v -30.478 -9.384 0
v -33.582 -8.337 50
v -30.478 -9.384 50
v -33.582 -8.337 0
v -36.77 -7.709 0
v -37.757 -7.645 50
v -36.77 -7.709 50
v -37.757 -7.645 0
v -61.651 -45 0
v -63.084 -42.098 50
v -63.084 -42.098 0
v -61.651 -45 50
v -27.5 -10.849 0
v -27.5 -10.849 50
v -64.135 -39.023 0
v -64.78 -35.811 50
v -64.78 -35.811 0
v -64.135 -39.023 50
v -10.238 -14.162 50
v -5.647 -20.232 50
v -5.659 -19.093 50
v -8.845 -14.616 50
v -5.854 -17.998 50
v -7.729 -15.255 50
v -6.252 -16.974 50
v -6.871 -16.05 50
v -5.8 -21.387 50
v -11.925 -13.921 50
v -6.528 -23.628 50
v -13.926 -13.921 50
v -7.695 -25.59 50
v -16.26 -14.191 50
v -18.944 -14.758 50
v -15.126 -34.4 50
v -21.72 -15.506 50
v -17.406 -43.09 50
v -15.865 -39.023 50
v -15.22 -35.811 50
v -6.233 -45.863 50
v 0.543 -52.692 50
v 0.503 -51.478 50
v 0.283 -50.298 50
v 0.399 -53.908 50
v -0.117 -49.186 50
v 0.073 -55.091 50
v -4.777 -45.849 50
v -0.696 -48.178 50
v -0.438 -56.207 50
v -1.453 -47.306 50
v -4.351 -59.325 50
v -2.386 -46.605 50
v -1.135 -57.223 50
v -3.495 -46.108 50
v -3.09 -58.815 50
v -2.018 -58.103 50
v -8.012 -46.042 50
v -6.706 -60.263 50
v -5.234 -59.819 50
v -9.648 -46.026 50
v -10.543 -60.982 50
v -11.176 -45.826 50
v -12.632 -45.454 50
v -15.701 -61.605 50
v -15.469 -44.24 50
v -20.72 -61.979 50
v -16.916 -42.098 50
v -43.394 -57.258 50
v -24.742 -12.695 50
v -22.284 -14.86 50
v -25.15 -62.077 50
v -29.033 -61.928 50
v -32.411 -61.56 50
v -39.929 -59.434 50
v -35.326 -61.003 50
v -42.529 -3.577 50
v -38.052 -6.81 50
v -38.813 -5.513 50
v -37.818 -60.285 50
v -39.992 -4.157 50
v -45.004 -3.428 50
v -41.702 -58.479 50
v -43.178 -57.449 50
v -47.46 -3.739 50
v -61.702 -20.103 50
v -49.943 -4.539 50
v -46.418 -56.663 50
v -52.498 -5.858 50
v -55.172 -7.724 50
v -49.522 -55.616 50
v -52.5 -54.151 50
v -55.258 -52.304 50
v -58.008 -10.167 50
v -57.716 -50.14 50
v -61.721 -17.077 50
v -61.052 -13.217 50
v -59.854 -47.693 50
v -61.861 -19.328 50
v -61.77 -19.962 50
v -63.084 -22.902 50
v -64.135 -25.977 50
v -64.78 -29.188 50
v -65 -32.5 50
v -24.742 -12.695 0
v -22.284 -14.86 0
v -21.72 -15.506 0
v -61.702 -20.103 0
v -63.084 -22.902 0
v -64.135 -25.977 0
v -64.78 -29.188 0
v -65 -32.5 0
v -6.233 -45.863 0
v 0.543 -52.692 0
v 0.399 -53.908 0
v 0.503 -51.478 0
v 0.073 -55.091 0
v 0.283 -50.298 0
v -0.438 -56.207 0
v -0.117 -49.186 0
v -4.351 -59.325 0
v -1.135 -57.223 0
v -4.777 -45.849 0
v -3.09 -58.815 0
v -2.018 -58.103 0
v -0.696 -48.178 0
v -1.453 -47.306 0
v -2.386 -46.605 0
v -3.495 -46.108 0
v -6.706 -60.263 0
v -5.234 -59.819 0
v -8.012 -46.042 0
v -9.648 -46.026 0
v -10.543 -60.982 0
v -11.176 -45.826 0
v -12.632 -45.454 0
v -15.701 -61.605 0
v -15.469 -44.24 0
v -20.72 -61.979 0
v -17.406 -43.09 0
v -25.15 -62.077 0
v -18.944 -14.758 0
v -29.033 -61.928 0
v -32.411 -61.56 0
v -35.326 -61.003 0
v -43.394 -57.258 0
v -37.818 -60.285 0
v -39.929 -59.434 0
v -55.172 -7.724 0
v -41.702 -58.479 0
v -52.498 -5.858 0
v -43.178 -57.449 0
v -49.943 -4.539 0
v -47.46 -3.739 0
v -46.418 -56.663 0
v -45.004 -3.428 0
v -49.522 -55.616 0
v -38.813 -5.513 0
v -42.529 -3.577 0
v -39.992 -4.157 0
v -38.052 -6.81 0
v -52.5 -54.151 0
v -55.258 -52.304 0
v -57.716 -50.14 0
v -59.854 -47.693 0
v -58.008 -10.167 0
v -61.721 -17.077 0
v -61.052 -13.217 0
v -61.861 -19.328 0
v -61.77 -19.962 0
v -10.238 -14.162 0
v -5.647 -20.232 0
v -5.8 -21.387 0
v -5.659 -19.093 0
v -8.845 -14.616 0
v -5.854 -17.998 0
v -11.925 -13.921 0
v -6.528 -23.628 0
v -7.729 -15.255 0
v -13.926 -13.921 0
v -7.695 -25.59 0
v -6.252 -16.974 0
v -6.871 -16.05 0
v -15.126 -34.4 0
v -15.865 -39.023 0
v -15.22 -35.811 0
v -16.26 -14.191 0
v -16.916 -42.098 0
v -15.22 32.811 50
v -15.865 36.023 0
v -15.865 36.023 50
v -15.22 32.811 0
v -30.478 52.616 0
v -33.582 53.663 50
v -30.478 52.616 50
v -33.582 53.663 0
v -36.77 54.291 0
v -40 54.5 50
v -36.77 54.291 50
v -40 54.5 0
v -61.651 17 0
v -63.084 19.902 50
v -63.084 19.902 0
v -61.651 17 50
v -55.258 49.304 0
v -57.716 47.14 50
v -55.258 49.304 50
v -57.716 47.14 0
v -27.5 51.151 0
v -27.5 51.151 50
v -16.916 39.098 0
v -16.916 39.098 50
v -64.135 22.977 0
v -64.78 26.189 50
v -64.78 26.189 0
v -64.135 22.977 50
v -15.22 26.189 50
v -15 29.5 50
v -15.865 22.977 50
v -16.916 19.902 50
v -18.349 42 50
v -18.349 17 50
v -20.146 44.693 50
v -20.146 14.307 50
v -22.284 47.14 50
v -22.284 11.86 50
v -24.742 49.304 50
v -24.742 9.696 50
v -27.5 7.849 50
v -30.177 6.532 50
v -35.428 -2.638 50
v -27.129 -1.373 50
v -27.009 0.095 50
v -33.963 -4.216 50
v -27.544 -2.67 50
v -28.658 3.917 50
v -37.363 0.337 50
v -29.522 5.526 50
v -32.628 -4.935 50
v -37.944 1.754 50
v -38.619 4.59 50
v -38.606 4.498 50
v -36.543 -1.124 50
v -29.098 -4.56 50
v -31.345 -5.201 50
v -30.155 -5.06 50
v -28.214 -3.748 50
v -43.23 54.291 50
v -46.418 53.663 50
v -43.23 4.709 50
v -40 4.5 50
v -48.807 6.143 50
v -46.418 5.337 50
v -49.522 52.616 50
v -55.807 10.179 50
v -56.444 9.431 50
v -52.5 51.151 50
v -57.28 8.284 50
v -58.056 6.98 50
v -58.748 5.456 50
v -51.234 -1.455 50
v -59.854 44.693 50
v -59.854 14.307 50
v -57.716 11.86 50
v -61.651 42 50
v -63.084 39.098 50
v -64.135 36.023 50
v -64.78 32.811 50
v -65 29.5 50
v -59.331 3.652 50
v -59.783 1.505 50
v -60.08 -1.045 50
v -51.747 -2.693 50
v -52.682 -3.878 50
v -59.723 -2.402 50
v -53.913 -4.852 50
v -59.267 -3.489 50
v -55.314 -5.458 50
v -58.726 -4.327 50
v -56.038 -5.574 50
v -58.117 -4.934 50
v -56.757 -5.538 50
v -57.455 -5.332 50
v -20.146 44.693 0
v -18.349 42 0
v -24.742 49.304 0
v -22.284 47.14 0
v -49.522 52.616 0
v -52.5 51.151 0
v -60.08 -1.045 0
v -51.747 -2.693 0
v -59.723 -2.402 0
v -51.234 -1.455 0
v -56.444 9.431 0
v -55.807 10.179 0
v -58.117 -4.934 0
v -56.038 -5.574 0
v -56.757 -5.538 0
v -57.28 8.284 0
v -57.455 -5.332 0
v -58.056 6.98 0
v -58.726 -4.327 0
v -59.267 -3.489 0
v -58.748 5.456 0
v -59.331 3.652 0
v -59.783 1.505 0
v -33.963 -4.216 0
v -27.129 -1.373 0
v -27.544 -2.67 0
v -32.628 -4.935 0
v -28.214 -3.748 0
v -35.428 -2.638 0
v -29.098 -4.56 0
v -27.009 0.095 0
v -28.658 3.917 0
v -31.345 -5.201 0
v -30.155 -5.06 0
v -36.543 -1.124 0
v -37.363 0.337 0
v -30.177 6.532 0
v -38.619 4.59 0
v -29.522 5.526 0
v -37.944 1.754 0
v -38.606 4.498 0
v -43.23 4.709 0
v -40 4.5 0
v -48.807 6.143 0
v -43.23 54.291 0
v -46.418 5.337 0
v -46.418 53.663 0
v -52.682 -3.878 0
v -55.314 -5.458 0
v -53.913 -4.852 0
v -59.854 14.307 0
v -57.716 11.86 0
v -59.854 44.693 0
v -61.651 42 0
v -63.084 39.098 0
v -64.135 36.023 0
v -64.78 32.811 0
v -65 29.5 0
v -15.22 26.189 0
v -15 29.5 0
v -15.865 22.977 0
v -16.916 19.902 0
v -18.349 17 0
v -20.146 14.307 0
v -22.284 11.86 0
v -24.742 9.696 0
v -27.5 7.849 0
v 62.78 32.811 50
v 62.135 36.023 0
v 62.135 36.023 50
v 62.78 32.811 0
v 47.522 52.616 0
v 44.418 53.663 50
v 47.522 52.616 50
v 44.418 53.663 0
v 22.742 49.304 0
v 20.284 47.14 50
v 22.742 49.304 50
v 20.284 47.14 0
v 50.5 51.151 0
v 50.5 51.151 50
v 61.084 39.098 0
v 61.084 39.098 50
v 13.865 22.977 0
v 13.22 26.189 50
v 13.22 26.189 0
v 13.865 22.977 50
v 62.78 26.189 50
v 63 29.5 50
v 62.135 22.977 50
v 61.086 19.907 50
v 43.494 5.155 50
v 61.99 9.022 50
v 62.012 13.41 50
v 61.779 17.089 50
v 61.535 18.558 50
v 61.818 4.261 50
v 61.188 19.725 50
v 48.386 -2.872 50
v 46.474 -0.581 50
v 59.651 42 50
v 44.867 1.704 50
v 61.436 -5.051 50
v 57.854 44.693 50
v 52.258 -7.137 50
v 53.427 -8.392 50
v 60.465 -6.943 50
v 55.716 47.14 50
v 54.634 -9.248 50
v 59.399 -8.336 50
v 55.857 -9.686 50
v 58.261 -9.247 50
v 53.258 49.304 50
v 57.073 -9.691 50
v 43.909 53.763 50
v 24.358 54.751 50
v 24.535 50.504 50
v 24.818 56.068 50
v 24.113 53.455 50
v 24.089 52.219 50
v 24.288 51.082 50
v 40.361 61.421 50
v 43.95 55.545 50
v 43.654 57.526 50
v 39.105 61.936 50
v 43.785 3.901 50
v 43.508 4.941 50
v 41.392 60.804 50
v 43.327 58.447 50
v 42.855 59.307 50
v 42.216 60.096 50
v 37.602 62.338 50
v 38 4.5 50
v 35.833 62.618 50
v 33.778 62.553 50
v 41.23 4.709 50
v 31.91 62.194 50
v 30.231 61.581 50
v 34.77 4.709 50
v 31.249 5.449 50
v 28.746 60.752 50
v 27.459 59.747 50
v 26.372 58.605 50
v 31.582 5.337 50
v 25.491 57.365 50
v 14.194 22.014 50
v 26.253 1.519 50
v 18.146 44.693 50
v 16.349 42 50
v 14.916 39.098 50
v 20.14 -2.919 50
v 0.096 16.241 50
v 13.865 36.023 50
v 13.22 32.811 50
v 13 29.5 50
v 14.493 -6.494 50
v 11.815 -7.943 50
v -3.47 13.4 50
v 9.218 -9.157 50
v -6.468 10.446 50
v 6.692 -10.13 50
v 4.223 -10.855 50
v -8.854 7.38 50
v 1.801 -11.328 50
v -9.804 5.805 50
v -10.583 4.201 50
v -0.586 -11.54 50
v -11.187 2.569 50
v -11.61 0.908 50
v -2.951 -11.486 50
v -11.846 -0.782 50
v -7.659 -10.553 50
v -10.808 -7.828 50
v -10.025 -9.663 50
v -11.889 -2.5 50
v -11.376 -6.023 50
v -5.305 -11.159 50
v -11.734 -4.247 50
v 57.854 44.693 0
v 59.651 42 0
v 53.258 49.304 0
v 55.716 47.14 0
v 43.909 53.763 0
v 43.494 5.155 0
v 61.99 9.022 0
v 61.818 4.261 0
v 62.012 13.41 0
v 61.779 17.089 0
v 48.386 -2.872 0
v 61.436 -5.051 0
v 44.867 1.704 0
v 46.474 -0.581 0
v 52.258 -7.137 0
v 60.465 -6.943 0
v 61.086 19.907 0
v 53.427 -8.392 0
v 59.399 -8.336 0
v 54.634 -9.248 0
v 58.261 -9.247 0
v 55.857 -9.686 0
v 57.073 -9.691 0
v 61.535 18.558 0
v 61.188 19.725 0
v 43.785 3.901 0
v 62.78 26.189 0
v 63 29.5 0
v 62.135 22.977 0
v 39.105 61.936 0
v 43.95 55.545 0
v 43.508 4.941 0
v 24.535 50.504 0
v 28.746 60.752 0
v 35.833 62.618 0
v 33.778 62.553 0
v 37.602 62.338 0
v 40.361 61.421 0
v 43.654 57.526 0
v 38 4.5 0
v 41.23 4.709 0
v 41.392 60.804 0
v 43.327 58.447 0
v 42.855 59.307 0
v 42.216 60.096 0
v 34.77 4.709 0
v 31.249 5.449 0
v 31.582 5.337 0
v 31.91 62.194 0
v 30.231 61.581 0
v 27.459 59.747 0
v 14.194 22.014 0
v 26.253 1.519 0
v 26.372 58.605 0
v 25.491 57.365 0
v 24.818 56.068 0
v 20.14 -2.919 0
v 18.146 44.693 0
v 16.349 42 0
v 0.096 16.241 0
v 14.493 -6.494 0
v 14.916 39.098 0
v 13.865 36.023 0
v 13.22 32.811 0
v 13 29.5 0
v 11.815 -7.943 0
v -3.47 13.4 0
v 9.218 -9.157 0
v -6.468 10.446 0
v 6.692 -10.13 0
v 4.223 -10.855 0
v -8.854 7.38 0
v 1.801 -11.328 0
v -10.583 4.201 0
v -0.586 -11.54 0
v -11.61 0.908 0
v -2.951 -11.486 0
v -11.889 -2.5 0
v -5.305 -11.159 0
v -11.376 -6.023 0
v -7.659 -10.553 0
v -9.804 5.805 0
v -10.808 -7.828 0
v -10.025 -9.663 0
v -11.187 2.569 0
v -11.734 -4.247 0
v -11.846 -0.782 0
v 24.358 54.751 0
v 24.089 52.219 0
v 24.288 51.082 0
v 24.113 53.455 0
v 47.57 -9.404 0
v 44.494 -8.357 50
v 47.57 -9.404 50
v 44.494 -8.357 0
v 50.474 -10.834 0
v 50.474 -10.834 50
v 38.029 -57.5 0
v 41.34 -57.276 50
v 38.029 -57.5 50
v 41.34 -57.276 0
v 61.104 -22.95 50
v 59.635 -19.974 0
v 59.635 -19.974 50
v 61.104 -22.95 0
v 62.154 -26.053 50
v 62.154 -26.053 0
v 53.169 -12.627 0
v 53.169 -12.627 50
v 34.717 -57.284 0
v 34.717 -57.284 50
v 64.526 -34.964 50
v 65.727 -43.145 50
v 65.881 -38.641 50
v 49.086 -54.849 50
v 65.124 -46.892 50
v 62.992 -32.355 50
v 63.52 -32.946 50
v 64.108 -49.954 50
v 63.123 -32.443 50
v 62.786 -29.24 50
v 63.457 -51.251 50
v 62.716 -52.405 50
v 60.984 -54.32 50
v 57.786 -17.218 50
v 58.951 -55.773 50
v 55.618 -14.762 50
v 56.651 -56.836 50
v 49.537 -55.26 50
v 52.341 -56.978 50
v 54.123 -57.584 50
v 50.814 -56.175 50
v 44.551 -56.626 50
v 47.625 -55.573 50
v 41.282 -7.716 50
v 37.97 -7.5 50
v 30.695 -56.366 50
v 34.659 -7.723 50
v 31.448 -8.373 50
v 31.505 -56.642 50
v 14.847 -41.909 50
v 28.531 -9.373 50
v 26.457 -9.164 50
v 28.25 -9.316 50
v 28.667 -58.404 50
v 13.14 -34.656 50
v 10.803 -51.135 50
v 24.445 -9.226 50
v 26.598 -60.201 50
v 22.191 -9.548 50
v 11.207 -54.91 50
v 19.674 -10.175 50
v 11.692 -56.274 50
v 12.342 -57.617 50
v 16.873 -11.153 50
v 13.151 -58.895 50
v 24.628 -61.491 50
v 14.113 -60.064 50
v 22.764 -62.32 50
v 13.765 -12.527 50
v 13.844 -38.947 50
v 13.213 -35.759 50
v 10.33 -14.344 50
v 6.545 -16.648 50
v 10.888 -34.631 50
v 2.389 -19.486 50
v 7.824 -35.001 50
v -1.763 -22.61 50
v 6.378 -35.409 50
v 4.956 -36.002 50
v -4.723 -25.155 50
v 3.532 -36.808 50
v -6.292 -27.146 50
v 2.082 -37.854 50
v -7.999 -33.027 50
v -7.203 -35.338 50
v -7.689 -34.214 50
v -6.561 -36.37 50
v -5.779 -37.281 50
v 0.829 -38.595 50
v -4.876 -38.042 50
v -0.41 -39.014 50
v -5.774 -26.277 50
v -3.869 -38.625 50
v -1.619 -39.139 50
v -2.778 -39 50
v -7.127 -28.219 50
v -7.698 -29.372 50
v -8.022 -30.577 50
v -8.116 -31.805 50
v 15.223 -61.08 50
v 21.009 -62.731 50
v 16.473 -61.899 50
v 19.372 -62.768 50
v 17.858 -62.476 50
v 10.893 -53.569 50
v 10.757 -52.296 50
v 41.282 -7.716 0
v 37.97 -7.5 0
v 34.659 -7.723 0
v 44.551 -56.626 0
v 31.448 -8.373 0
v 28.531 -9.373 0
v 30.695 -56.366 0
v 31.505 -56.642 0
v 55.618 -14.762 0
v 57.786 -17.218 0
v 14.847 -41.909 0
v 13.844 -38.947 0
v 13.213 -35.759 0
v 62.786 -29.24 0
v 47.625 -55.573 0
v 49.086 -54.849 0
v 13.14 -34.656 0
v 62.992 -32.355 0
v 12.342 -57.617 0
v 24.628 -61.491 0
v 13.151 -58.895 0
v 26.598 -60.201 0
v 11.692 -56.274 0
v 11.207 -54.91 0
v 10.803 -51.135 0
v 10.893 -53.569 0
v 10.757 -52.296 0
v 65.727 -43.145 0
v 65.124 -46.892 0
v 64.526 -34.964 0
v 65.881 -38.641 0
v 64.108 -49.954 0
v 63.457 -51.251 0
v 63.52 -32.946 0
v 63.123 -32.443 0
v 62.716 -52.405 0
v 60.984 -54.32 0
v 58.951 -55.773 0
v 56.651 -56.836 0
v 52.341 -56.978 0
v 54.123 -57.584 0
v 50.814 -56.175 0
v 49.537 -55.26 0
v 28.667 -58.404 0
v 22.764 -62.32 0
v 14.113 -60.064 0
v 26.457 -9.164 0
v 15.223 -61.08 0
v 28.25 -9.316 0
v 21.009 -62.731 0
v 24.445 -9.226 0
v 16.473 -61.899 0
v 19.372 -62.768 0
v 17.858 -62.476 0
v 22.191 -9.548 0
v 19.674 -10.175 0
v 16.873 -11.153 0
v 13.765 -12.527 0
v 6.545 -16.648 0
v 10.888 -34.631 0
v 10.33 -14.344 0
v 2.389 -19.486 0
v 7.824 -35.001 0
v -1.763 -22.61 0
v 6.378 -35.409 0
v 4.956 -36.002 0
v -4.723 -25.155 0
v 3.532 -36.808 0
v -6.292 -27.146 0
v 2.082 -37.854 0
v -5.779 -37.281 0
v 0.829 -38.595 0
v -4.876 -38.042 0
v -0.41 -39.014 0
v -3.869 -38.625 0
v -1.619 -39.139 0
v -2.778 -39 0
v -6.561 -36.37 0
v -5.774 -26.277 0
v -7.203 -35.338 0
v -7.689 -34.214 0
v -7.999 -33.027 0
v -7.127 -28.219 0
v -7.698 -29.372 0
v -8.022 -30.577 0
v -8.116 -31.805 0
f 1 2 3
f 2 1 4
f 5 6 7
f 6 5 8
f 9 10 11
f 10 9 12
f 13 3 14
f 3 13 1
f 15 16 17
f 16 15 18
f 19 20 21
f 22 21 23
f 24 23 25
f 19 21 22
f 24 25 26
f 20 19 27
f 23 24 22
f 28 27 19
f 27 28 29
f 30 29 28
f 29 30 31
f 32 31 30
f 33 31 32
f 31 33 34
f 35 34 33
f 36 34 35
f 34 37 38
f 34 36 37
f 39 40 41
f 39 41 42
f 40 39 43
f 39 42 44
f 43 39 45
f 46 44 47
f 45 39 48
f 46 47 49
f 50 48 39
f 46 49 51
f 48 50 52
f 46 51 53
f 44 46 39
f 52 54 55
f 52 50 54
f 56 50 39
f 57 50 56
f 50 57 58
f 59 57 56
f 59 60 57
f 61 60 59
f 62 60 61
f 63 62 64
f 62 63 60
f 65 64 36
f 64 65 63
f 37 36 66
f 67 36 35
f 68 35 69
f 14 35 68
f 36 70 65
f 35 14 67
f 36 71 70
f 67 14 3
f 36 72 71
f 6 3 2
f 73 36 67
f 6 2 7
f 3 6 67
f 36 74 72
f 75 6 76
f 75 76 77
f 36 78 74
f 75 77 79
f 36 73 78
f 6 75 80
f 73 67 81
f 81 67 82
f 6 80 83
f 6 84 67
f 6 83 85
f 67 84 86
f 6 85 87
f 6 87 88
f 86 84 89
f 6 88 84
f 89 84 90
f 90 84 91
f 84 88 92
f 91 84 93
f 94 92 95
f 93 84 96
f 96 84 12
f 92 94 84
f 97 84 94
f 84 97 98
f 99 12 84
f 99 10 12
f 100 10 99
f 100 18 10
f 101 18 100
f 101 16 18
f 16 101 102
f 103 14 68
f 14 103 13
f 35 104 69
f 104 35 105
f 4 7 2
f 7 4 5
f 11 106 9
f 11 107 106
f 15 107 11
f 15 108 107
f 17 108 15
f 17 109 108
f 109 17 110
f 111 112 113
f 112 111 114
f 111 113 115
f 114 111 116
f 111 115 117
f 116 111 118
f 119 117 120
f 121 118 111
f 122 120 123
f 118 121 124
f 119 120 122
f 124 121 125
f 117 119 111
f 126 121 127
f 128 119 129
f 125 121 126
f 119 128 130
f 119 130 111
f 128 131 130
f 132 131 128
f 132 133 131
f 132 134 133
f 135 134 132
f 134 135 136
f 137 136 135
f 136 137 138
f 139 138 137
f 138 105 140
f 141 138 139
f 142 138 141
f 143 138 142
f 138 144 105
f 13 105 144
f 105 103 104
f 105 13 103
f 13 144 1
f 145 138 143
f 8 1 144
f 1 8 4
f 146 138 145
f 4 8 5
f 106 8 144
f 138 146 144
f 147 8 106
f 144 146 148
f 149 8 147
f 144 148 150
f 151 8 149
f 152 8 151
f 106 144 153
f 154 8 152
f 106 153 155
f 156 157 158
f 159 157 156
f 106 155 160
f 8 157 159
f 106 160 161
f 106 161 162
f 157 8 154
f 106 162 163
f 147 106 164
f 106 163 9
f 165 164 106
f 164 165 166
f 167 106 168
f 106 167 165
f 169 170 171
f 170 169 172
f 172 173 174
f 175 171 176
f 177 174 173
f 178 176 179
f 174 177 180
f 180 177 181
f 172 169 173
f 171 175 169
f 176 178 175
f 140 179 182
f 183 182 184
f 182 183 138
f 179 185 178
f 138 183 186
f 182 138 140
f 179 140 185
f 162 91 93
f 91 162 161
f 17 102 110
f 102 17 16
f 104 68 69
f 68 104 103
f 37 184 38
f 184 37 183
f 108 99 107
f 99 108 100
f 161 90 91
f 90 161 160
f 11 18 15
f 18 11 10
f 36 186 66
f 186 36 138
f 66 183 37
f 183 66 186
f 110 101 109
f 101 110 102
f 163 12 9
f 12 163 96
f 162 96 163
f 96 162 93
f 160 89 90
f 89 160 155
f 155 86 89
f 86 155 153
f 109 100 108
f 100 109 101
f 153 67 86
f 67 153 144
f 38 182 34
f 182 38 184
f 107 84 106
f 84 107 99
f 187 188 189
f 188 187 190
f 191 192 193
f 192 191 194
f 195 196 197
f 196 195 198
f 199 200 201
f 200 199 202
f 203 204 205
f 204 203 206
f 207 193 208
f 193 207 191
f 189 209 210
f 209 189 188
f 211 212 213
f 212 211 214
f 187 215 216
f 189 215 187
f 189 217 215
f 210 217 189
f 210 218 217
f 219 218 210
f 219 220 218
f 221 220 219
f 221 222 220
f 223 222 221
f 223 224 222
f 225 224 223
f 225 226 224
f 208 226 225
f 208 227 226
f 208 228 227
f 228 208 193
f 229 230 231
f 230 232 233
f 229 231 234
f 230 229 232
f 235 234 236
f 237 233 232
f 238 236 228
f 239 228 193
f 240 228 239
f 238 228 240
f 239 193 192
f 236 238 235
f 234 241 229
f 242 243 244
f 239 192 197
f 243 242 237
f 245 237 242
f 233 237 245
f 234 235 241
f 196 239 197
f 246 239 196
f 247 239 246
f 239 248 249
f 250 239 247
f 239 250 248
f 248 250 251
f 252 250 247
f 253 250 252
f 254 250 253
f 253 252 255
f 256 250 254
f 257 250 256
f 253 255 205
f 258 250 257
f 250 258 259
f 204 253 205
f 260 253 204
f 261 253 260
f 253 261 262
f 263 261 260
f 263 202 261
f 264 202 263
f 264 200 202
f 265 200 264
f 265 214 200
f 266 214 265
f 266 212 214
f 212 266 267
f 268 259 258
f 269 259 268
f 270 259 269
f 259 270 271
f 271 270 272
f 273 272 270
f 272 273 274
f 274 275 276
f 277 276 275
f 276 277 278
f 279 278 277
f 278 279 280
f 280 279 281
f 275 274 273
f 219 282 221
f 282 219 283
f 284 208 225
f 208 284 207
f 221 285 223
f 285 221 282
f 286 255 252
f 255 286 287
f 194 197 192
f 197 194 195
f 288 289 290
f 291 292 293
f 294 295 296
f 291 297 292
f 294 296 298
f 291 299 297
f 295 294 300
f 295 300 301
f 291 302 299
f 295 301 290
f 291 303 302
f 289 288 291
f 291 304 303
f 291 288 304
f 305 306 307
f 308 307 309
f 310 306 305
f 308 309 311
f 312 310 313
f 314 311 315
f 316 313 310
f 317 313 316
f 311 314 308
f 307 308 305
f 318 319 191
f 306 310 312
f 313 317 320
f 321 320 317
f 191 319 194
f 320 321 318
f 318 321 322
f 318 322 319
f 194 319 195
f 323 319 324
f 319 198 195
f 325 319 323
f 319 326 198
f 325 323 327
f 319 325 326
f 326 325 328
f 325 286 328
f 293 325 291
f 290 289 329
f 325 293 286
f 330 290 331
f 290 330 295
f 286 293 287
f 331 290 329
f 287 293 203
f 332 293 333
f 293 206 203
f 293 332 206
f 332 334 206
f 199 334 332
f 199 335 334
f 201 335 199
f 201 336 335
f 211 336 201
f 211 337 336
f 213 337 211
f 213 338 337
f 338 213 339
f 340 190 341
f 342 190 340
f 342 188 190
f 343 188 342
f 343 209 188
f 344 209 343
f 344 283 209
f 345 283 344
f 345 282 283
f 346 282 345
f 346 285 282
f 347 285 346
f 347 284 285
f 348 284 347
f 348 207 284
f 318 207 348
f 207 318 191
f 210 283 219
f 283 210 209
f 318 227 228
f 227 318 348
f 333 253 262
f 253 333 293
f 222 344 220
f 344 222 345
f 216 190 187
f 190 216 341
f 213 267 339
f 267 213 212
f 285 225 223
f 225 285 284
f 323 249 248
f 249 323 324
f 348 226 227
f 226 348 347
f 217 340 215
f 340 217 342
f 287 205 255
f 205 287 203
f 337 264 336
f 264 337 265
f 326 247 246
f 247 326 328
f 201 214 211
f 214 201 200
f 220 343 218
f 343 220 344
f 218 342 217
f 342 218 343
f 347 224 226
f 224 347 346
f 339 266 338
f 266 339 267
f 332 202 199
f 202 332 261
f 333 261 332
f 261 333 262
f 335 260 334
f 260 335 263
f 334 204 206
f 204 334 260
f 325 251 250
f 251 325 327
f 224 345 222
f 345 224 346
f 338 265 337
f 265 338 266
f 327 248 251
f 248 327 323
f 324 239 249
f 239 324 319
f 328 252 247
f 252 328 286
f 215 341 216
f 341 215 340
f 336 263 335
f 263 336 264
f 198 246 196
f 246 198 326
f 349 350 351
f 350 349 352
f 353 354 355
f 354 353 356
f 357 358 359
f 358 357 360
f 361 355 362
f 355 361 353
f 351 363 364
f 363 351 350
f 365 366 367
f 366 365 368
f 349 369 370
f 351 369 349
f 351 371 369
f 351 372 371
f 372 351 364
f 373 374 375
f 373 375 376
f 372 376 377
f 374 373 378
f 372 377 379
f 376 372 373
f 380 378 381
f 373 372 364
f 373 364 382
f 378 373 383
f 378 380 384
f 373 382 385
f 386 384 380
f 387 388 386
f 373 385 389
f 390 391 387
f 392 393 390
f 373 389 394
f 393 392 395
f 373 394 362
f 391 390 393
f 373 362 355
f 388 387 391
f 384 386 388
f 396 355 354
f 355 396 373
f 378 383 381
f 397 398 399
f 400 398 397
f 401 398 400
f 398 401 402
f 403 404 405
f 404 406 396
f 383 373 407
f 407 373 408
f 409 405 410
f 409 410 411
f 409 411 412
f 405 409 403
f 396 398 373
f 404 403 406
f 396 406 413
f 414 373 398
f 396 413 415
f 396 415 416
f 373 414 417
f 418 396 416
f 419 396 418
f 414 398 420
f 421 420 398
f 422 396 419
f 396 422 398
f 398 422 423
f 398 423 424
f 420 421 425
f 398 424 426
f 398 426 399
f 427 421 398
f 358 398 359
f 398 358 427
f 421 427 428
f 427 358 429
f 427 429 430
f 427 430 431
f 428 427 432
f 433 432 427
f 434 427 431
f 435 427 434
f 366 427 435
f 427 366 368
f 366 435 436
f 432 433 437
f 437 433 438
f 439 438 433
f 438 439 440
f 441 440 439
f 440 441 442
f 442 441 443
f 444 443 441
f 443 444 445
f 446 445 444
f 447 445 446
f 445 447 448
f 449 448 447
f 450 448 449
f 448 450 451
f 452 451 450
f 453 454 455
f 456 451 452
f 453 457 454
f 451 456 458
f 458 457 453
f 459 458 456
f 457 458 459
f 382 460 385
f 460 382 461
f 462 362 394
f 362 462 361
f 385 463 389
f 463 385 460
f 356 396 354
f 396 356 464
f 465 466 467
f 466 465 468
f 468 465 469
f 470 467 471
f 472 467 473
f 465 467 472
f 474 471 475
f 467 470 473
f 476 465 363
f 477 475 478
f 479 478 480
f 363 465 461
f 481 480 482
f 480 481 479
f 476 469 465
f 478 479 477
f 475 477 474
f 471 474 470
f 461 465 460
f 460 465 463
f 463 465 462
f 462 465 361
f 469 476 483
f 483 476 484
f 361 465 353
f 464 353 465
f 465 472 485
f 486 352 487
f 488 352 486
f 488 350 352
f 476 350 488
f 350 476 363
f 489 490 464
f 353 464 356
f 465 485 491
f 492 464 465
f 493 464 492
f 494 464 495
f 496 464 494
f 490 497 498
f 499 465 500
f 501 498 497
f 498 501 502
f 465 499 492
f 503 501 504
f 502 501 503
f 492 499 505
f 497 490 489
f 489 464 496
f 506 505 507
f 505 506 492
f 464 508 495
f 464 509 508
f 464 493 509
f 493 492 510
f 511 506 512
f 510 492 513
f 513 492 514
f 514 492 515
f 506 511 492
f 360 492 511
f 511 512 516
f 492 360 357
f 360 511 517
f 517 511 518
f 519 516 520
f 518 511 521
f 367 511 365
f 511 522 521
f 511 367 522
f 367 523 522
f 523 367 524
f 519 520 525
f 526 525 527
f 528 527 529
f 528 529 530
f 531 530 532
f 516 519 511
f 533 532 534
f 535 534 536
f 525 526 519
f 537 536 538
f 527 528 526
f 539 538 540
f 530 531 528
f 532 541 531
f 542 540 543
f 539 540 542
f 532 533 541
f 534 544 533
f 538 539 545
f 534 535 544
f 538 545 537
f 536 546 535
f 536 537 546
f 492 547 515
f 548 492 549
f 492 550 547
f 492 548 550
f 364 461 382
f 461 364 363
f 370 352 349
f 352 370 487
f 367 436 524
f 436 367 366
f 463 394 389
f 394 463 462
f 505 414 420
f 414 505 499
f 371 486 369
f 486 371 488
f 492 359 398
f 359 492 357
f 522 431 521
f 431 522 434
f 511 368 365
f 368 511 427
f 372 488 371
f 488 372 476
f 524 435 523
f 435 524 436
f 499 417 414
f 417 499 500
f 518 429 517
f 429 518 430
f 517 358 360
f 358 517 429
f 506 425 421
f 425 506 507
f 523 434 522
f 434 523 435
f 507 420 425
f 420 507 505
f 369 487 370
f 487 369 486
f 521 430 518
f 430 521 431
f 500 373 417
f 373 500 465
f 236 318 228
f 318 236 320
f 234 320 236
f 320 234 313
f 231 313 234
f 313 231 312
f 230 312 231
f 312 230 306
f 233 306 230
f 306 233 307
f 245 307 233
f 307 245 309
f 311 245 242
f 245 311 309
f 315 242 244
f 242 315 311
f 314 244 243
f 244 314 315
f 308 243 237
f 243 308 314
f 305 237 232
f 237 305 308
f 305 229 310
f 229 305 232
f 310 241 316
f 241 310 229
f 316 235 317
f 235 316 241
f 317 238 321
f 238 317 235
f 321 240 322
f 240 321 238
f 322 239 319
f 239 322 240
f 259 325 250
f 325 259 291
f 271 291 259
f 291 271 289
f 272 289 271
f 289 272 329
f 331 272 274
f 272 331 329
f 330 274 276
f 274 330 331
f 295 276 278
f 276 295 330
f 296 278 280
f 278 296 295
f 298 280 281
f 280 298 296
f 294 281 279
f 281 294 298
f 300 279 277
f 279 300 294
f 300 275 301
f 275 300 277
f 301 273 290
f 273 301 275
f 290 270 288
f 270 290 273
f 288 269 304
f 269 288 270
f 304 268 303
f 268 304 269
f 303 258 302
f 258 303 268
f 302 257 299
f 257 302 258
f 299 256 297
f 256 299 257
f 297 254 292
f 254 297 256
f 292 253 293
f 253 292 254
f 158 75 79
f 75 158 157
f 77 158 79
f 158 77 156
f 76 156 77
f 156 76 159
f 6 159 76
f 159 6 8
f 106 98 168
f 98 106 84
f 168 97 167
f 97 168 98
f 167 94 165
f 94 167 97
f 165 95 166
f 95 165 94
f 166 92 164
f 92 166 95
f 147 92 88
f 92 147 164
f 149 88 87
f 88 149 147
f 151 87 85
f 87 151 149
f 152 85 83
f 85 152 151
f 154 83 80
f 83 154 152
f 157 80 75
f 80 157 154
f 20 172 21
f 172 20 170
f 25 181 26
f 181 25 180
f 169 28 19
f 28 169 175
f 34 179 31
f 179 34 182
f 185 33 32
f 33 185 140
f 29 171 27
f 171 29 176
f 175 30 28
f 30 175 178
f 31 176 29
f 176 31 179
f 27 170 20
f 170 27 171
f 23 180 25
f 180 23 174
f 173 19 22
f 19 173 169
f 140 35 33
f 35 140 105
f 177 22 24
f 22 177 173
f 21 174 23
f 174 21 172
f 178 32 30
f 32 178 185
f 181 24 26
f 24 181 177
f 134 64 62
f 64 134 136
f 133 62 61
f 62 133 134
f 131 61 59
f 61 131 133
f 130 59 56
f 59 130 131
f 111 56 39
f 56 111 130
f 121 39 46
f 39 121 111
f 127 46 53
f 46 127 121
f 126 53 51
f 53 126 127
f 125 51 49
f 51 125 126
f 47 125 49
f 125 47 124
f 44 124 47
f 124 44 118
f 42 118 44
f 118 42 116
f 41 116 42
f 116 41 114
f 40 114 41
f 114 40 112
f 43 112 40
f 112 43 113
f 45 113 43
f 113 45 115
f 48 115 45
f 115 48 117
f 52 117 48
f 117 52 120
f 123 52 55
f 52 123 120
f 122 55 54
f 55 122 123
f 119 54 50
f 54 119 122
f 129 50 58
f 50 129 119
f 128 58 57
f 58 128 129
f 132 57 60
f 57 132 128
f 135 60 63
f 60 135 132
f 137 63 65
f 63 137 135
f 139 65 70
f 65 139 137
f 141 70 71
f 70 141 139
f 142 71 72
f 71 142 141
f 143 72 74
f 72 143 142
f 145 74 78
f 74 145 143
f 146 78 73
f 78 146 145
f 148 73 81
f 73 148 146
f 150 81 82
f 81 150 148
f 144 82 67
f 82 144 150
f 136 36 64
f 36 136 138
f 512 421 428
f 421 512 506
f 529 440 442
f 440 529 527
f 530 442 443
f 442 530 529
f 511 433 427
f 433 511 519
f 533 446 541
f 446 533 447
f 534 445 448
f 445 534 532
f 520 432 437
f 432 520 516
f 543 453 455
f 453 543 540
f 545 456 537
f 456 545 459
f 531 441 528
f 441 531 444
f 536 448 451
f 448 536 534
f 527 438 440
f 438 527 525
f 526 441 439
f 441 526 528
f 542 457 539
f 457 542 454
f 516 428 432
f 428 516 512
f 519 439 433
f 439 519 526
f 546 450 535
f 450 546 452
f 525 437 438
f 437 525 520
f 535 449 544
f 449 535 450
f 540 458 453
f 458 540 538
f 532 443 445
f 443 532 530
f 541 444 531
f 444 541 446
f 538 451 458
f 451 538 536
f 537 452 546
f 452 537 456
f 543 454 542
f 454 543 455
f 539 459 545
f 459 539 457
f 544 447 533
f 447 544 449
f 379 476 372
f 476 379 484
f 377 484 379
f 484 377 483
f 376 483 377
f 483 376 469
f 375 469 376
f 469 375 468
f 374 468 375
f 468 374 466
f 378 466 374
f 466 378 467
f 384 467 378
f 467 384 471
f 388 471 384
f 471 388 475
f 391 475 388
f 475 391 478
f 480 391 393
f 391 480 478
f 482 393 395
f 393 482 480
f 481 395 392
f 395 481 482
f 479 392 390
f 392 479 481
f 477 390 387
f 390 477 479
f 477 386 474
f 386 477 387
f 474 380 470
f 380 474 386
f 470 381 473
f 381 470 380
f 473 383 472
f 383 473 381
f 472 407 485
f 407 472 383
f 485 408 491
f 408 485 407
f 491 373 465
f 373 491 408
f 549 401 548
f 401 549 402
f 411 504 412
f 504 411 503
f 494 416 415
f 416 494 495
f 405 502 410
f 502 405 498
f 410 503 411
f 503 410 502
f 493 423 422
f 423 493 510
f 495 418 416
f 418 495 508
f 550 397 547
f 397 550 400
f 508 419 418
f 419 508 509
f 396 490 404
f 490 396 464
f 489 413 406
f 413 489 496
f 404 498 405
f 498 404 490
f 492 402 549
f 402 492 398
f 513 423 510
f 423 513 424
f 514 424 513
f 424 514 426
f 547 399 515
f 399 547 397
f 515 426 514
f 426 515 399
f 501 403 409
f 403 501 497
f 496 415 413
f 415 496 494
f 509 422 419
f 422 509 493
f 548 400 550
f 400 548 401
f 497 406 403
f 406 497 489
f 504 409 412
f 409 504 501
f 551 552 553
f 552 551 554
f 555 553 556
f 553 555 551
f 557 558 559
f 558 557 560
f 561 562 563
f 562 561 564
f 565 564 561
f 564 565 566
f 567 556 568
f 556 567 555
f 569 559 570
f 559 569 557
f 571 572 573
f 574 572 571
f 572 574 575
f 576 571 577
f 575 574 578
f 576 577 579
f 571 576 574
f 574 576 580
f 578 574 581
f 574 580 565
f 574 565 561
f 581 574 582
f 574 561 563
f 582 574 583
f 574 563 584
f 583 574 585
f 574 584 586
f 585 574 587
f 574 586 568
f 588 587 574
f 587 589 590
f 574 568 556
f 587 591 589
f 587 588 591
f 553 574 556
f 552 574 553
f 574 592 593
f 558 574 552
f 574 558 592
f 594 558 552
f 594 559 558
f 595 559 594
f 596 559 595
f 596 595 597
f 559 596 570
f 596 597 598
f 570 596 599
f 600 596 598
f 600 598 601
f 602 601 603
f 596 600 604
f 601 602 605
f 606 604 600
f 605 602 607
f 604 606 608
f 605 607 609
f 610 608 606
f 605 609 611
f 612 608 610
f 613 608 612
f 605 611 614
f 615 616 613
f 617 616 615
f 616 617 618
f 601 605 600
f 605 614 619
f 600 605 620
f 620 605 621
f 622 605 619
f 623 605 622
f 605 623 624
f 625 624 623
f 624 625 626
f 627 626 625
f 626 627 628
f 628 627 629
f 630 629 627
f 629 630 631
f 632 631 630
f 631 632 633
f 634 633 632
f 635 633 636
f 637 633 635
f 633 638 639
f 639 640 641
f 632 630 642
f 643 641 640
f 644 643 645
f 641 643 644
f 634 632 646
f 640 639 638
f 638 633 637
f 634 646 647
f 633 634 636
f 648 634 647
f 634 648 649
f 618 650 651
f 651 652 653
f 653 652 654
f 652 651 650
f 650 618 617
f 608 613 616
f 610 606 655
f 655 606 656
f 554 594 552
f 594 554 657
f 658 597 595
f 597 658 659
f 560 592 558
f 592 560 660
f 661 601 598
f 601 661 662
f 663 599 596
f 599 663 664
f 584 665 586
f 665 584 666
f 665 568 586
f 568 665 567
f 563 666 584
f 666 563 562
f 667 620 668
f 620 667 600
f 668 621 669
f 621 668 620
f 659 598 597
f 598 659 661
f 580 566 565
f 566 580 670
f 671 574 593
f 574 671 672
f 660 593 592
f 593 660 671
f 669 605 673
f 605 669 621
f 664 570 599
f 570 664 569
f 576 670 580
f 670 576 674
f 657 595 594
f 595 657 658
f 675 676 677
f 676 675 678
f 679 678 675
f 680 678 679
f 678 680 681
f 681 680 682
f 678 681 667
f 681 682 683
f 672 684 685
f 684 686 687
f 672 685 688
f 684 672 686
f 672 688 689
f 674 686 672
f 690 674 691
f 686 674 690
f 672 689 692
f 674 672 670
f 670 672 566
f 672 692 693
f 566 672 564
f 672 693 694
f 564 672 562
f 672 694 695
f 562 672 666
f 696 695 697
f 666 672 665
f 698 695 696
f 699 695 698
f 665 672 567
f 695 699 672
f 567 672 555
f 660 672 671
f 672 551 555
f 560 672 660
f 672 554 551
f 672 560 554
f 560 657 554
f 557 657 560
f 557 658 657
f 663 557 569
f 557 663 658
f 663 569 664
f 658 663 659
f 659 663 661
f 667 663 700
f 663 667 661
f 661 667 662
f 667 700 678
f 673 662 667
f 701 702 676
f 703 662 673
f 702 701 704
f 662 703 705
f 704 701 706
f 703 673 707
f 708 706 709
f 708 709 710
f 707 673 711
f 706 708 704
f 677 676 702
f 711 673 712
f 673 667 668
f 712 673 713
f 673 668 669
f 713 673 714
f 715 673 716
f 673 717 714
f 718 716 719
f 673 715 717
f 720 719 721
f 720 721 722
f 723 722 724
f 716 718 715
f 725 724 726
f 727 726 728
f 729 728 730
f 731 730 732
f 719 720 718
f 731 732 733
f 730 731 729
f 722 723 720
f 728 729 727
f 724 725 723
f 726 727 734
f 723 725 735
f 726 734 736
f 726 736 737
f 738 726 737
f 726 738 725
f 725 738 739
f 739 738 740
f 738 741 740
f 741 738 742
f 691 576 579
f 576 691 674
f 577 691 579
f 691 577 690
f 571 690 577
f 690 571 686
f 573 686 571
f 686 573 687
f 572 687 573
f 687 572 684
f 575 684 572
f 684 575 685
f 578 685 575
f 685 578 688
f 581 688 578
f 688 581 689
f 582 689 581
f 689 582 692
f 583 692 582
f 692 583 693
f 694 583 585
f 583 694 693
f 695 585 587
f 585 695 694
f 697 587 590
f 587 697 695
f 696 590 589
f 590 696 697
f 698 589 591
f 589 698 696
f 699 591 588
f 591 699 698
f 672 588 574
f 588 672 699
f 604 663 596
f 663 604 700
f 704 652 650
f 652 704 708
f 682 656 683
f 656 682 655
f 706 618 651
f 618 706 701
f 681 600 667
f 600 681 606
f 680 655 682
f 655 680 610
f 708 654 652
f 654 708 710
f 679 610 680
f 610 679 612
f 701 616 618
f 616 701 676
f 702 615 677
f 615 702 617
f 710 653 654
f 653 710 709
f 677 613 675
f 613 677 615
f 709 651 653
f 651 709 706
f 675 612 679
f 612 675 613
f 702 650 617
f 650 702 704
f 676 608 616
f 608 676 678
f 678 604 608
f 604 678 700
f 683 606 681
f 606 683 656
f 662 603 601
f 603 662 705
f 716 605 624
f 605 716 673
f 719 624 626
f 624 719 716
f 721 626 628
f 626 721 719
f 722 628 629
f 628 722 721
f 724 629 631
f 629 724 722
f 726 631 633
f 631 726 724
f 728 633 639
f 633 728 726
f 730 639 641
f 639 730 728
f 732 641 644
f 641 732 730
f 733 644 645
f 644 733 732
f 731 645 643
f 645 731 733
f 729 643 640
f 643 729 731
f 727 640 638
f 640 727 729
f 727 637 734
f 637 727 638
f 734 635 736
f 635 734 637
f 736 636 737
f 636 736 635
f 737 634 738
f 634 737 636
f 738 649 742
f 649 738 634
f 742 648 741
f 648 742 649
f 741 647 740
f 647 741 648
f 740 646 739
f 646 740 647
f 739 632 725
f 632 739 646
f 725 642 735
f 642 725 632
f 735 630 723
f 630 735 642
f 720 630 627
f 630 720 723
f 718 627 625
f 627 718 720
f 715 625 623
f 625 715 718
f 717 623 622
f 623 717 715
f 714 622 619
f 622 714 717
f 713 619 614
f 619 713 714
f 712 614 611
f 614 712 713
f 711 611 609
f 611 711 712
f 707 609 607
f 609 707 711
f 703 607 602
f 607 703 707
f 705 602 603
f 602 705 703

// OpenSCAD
// Generated by inkscape 1.0 (4035a4f, 2020-05-01) + inkscape-paths2openscad 0.27
// Sun Jul 12 13:38:14 2020 from "mini-outlines.svg"

// Module names are of the form poly_<inkscape-path-id>().  As a result,
// you can associate a polygon in this OpenSCAD program with the corresponding
// SVG element in the Inkscape document by looking for the XML element with
// the attribute id="inkscape-path-id".

// fudge value is used to ensure that subtracted solids are a tad taller
// in the z dimension than the polygon being subtracted from.  This helps
// keep the resulting .stl file manifold.
fudge = 0.1;
user_unit_scale_x = 1.0;
user_unit_scale_y = 1.0;
custom_scale_x = 1;
custom_scale_y = 1;
zsize = 50;
line_fn = 8;
min_line_width = 1.0;
line_width_scale = 1.0;
function min_line_mm(w) = max(min_line_width, w * line_width_scale) * 1;


uppertrayoutline_0mm_0_center = [0.000000,0.000000];
uppertrayoutline_0mm_0_points = [[-69.950005,-65.450005],[69.950005,-65.450005],[69.950005,65.450005],[-69.950005,65.450005],[-69.950005,-65.450005]];
module poly_uppertrayoutline_0mm(h, w, s, res=line_fn)
{
  scale([custom_scale_x, -custom_scale_y, 1]) union()
  {
    for (t = [0: len(uppertrayoutline_0mm_0_points)-2]) {
      hull() {
        translate(uppertrayoutline_0mm_0_points[t]) 
          cylinder(h=h, r=w/2, $fn=res);
        translate(uppertrayoutline_0mm_0_points[t + 1]) 
          cylinder(h=h, r=w/2, $fn=res);
      }
    }
  }
}

circle6663_0_center = [-40.000005,32.499995];
circle6663_0_points = [[-65.000005,32.499995],[-64.780153,35.811485],[-64.134618,39.022936],[-63.084436,42.097917],[-61.650640,44.999995],[-59.854265,47.692738],[-57.716344,50.139712],[-55.257913,52.304487],[-52.500005,54.150630],[-49.522244,55.615977],[-46.418279,56.662654],[-43.230176,57.290660],[-40.000005,57.499995],[-36.769834,57.290660],[-33.581731,56.662654],[-30.477766,55.615977],[-27.500005,54.150630],[-24.742097,52.304487],[-22.283666,50.139712],[-20.145745,47.692738],[-18.349370,44.999995],[-16.915574,42.097917],[-15.865392,39.022936],[-15.219857,35.811485],[-15.000005,32.499995],[-15.219857,29.188505],[-15.865392,25.977054],[-16.915574,22.902073],[-18.349370,19.999995],[-20.145745,17.307252],[-22.283666,14.860278],[-24.742097,12.695503],[-27.500005,10.849360],[-30.477766,9.384013],[-33.581731,8.337336],[-36.769834,7.709330],[-40.000005,7.499995],[-43.230176,7.709330],[-46.418279,8.337336],[-49.522244,9.384013],[-52.500005,10.849360],[-55.257913,12.695503],[-57.716344,14.860278],[-59.854265,17.307252],[-61.650640,19.999995],[-63.084436,22.902073],[-64.134618,25.977054],[-64.780153,29.188505],[-65.000005,32.499995]];
module poly_circle6663(h, w, s, res=line_fn)
{
  scale([custom_scale_x, -custom_scale_y, 1]) union()
  {
    translate (circle6663_0_center) linear_extrude(height=h, convexity=10, scale=0.01*s)
      translate (-circle6663_0_center) polygon(circle6663_0_points);
  }
}

circle6665_0_center = [-40.000005,-29.500005];
circle6665_0_points = [[-65.000005,-29.500005],[-64.780153,-26.188515],[-64.134618,-22.977064],[-63.084436,-19.902083],[-61.650640,-17.000005],[-59.854265,-14.307262],[-57.716344,-11.860288],[-55.257913,-9.695513],[-52.500005,-7.849370],[-49.522244,-6.384023],[-46.418279,-5.337346],[-43.230176,-4.709340],[-40.000005,-4.500005],[-36.769834,-4.709340],[-33.581731,-5.337346],[-30.477766,-6.384023],[-27.500005,-7.849370],[-24.742097,-9.695513],[-22.283666,-11.860288],[-20.145745,-14.307262],[-18.349370,-17.000005],[-16.915574,-19.902083],[-15.865392,-22.977064],[-15.219857,-26.188515],[-15.000005,-29.500005],[-15.219857,-32.811495],[-15.865392,-36.022946],[-16.915574,-39.097927],[-18.349370,-42.000005],[-20.145745,-44.692748],[-22.283666,-47.139722],[-24.742097,-49.304497],[-27.500005,-51.150640],[-30.477766,-52.615987],[-33.581731,-53.662664],[-36.769834,-54.290670],[-40.000005,-54.500005],[-43.230176,-54.290670],[-46.418279,-53.662664],[-49.522244,-52.615987],[-52.500005,-51.150640],[-55.257913,-49.304497],[-57.716344,-47.139722],[-59.854265,-44.692748],[-61.650640,-42.000005],[-63.084436,-39.097927],[-64.134618,-36.022946],[-64.780153,-32.811495],[-65.000005,-29.500005]];
module poly_circle6665(h, w, s, res=line_fn)
{
  scale([custom_scale_x, -custom_scale_y, 1]) union()
  {
    translate (circle6665_0_center) linear_extrude(height=h, convexity=10, scale=0.01*s)
      translate (-circle6665_0_center) polygon(circle6665_0_points);
  }
}

circle7365_0_center = [37.999995,-29.500005];
circle7365_0_points = [[12.999995,-29.500005],[13.219847,-26.188515],[13.865382,-22.977063],[14.915564,-19.902083],[16.349360,-17.000005],[18.145735,-14.307262],[20.283656,-11.860287],[22.742087,-9.695512],[25.499995,-7.849369],[28.477756,-6.384022],[31.581721,-5.337346],[34.769824,-4.709340],[37.999995,-4.500005],[41.230166,-4.709340],[44.418269,-5.337346],[47.522235,-6.384022],[50.499995,-7.849370],[53.257903,-9.695512],[55.716335,-11.860287],[57.854255,-14.307262],[59.650630,-17.000005],[61.084426,-19.902083],[62.134608,-22.977064],[62.780143,-26.188515],[62.999995,-29.500005],[62.780143,-32.811495],[62.134608,-36.022946],[61.084426,-39.097927],[59.650630,-42.000005],[57.854255,-44.692748],[55.716335,-47.139723],[53.257903,-49.304498],[50.499995,-51.150640],[47.522235,-52.615988],[44.418269,-53.662664],[41.230166,-54.290670],[37.999995,-54.500005],[34.769824,-54.290670],[31.581721,-53.662664],[28.477756,-52.615988],[25.499995,-51.150641],[22.742087,-49.304498],[20.283656,-47.139723],[18.145735,-44.692748],[16.349360,-42.000005],[14.915564,-39.097928],[13.865382,-36.022947],[13.219847,-32.811495],[12.999995,-29.500005]];
module poly_circle7365(h, w, s, res=line_fn)
{
  scale([custom_scale_x, -custom_scale_y, 1]) union()
  {
    translate (circle7365_0_center) linear_extrude(height=h, convexity=10, scale=0.01*s)
      translate (-circle7365_0_center) polygon(circle7365_0_points);
  }
}

path7367_0_center = [-43.544760,-2.962140];
path7367_0_points = [[-54.683575,-11.498010],[-56.443710,-9.430908],[-57.280238,-8.284151],[-58.056158,-6.979812],[-58.747784,-5.456310],[-59.331431,-3.652060],[-59.783413,-1.505481],[-60.080045,1.045010],[-59.723441,2.401907],[-59.266866,3.489302],[-58.726133,4.326908],[-58.117059,4.934441],[-57.455459,5.331613],[-56.757147,5.538138],[-56.037939,5.573730],[-55.313650,5.458102],[-53.913088,4.852044],[-52.681983,3.877673],[-51.746855,2.692698],[-51.234225,1.454830],[-48.033975,-8.561420],[-38.969135,-7.186970],[-38.606378,-4.497730],[-37.944114,-1.754034],[-37.363299,-0.336788],[-36.542767,1.124042],[-35.427572,2.638448],[-33.962765,4.216420],[-32.628181,4.935107],[-31.345444,5.200637],[-30.155120,5.059936],[-29.097772,4.559930],[-28.213969,3.747545],[-27.544274,2.669708],[-27.129255,1.373344],[-27.009475,-0.094620],[-28.657681,-3.916866],[-29.521985,-5.526473],[-30.417572,-6.901461],[-31.347803,-8.016623],[-32.316038,-8.846753],[-33.325638,-9.366644],[-34.379965,-9.551090],[-54.683575,-11.498010]];
module poly_path7367(h, w, s, res=line_fn)
{
  scale([custom_scale_x, -custom_scale_y, 1]) union()
  {
    translate (path7367_0_center) linear_extrude(height=h, convexity=10, scale=0.01*s)
      translate (-path7367_0_center) polygon(path7367_0_points);
  }
}

path7369_0_center = [-49.661388,11.951976];
path7369_0_points = [[-37.760555,11.250640],[-37.578669,10.657009],[-37.461460,9.076471],[-37.627944,8.010028],[-38.051598,6.809558],[-38.812757,5.512626],[-39.991755,4.156800],[-42.529303,3.577244],[-45.003513,3.428318],[-47.459615,3.739283],[-49.942839,4.539397],[-52.498415,5.857920],[-55.171573,7.724110],[-58.007543,10.167227],[-61.051555,13.216530],[-61.721042,17.077407],[-61.861316,19.327875],[-61.770159,19.962288],[-61.591292,20.329797],[-61.339579,20.475634],[-61.029884,20.445032],[-60.296007,20.035441],[-59.508577,19.462885],[-58.786508,19.089225],[-58.487145,19.090061],[-58.248715,19.276320],[-37.760555,11.250640]];
module poly_path7369(h, w, s, res=line_fn)
{
  scale([custom_scale_x, -custom_scale_y, 1]) union()
  {
    translate (path7369_0_center) linear_extrude(height=h, convexity=10, scale=0.01*s)
      translate (-path7369_0_center) polygon(path7369_0_points);
  }
}

path7371_0_center = [-15.910898,25.186590];
path7371_0_points = [[-26.175085,16.705250],[-18.943665,14.758330],[-16.259726,14.190637],[-13.926448,13.920810],[-11.925287,13.920584],[-10.237696,14.161693],[-8.845130,14.615870],[-7.729044,15.254850],[-6.870891,16.050366],[-6.252128,16.974153],[-5.854206,17.997944],[-5.658583,19.093474],[-5.646711,20.232475],[-5.800045,21.386683],[-6.528151,23.627653],[-7.694535,25.590255],[-16.857675,36.452595],[-26.175085,16.705250]];
module poly_path7371(h, w, s, res=line_fn)
{
  scale([custom_scale_x, -custom_scale_y, 1]) union()
  {
    translate (path7371_0_center) linear_extrude(height=h, convexity=10, scale=0.01*s)
      translate (-path7371_0_center) polygon(path7371_0_points);
  }
}

path7373_0_center = [-24.065215,52.275535];
path7373_0_points = [[-21.864035,42.876735],[-18.441795,42.474215],[-15.468646,44.240481],[-12.631671,45.454480],[-11.175728,45.826059],[-9.647601,46.025587],[-8.011883,46.041735],[-6.233165,45.863175],[-4.777401,45.849402],[-3.494675,46.107901],[-2.386139,46.604760],[-1.452946,47.306067],[-0.696249,48.177913],[-0.117199,49.186384],[0.283050,50.297569],[0.503345,51.477557],[0.542535,52.692438],[0.399466,53.908298],[0.072986,55.091227],[-0.438057,56.207314],[-1.134816,57.222646],[-2.018443,58.103313],[-3.090092,58.815403],[-4.350915,59.325005],[-5.234260,59.818620],[-6.705748,60.262647],[-10.542841,60.981927],[-15.701275,61.605365],[-20.719863,61.978934],[-25.150000,62.076855],[-29.033272,61.927758],[-32.411266,61.560275],[-35.325567,61.003036],[-37.817764,60.284673],[-39.929441,59.433817],[-41.702186,58.479099],[-43.177586,57.449149],[-44.397225,56.372599],[-46.235574,54.194224],[-47.549923,52.173019],[-48.672965,50.538035],[-21.864035,42.876735]];
module poly_path7373(h, w, s, res=line_fn)
{
  scale([custom_scale_x, -custom_scale_y, 1]) union()
  {
    translate (path7373_0_center) linear_extrude(height=h, convexity=10, scale=0.01*s)
      translate (-path7373_0_center) polygon(path7373_0_points);
  }
}

path7375_0_center = [10.519333,-5.541755];
path7375_0_points = [[15.683722,-22.623280],[0.095685,-16.241460],[-3.469823,-13.399612],[-6.468213,-10.446047],[-8.854415,-7.380027],[-9.803863,-5.804616],[-10.583363,-4.200814],[-11.187282,-2.568529],[-11.609986,-0.907668],[-11.845843,0.781860],[-11.889218,2.500149],[-11.734479,4.247290],[-11.375991,6.023375],[-10.808121,7.828498],[-10.025235,9.662750],[-7.658832,10.553507],[-5.304724,11.159047],[-2.951186,11.485693],[-0.586494,11.539769],[1.801079,11.327600],[4.223257,10.855509],[6.691766,10.129821],[9.218330,9.156860],[11.814676,7.942949],[14.492528,6.494414],[20.139652,2.918763],[26.253503,-1.519499],[32.927885,-6.769780],[15.683722,-22.623280]];
module poly_path7375(h, w, s, res=line_fn)
{
  scale([custom_scale_x, -custom_scale_y, 1]) union()
  {
    translate (path7375_0_center) linear_extrude(height=h, convexity=10, scale=0.01*s)
      translate (-path7375_0_center) polygon(path7375_0_points);
  }
}

path7377_0_center = [52.727984,-5.652518];
path7377_0_points = [[45.861005,-9.133890],[44.801601,-8.463933],[44.063864,-7.699295],[43.620559,-6.850350],[43.444449,-5.927475],[43.508296,-4.941045],[43.784863,-3.901436],[44.867211,-1.704185],[46.473598,0.581272],[48.386128,2.871927],[52.258035,7.136810],[53.427014,8.392325],[54.633884,9.247558],[55.856602,9.686041],[57.073124,9.691306],[58.261406,9.246885],[59.399404,8.336309],[60.465075,6.943110],[61.436375,5.050820],[61.817577,-4.260783],[61.989857,-9.022489],[62.011520,-13.409706],[61.778766,-17.088614],[61.534545,-18.558134],[61.187795,-19.725394],[60.725540,-20.548667],[60.134805,-20.986226],[59.402615,-20.996342],[58.515995,-20.537290],[45.861005,-9.133890]];
module poly_path7377(h, w, s, res=line_fn)
{
  scale([custom_scale_x, -custom_scale_y, 1]) union()
  {
    translate (path7377_0_center) linear_extrude(height=h, convexity=10, scale=0.01*s)
      translate (-path7377_0_center) polygon(path7377_0_points);
  }
}

path7379_0_center = [34.019291,-55.463445];
path7379_0_points = [[27.397285,-48.308420],[26.265739,-48.656684],[25.372890,-49.261159],[24.714981,-50.082546],[24.288257,-51.081547],[24.088963,-52.218862],[24.113343,-53.455191],[24.357642,-54.751236],[24.818105,-56.067698],[25.490976,-57.365276],[26.372499,-58.604672],[27.458919,-59.746587],[28.746481,-60.751722],[30.231429,-61.580776],[31.910007,-62.194452],[33.778461,-62.553450],[35.833035,-62.618470],[37.601991,-62.338319],[39.104770,-61.935659],[40.361412,-61.420833],[41.391961,-60.804187],[42.216457,-60.096062],[42.854943,-59.306803],[43.327461,-58.446754],[43.654051,-57.526257],[43.949619,-55.545300],[43.901981,-53.446680],[43.418425,-49.227450],[27.397285,-48.308420]];
module poly_path7379(h, w, s, res=line_fn)
{
  scale([custom_scale_x, -custom_scale_y, 1]) union()
  {
    translate (path7379_0_center) linear_extrude(height=h, convexity=10, scale=0.01*s)
      translate (-path7379_0_center) polygon(path7379_0_points);
  }
}

circle3647_0_center = [37.999433,32.499611];
circle3647_0_points = [[59.635218,19.973925],[57.785803,17.218209],[55.618112,14.762349],[53.168601,12.627334],[50.473729,10.834156],[47.569951,9.403806],[44.493726,8.357274],[41.281511,7.715551],[37.969763,7.499629],[34.658536,7.723411],[31.447853,8.372757],[28.374121,9.426588],[25.473746,10.863827],[22.783138,12.663396],[20.338702,14.804219],[18.176846,17.265218],[16.333978,20.025316],[14.872166,23.004813],[13.829174,26.110019],[13.204952,29.298865],[12.999451,32.529282],[13.212620,35.759202],[13.844409,38.946557],[14.894768,42.049279],[16.363649,45.025298],[18.213063,47.781013],[20.380754,50.236874],[22.830265,52.371888],[25.525137,54.165066],[28.428915,55.595417],[31.505140,56.641949],[34.717355,57.283672],[38.029104,57.499594],[41.340330,57.275811],[44.551013,56.626466],[47.624746,55.572635],[50.525120,54.135396],[53.215728,52.335826],[55.660164,50.195003],[57.822020,47.734004],[59.664888,44.973907],[61.126700,41.994409],[62.169692,38.889204],[62.793914,35.700358],[62.999415,32.469941],[62.786247,29.240020],[62.154457,26.052665],[61.104098,22.949944],[59.635218,19.973925]];
module poly_circle3647(h, w, s, res=line_fn)
{
  scale([custom_scale_x, -custom_scale_y, 1]) union()
  {
    translate (circle3647_0_center) linear_extrude(height=h, convexity=10, scale=0.01*s)
      translate (-circle3647_0_center) polygon(circle3647_0_points);
  }
}

path3649_0_center = [56.294945,44.899424];
path3649_0_points = [[46.709105,52.011925],[47.150561,52.702923],[48.504186,54.318960],[49.536777,55.259669],[50.813869,56.174599],[52.340946,56.978071],[54.123495,57.584405],[56.651382,56.836098],[58.950678,55.772685],[60.984503,54.320342],[62.715977,52.405251],[63.456809,51.251106],[64.108222,49.953590],[65.124358,46.891537],[65.727505,43.145273],[65.880785,38.640975],[64.525745,34.964232],[63.519579,32.946334],[63.122826,32.442969],[62.783895,32.214537],[62.492987,32.214443],[62.240301,32.396095],[61.810404,33.118265],[61.415810,34.008301],[60.978128,34.693459],[60.718631,34.842726],[60.418965,34.800995],[46.709105,52.011925]];
module poly_path3649(h, w, s, res=line_fn)
{
  scale([custom_scale_x, -custom_scale_y, 1]) union()
  {
    translate (path3649_0_center) linear_extrude(height=h, convexity=10, scale=0.01*s)
      translate (-path3649_0_center) polygon(path3649_0_points);
  }
}

path3651_0_center = [22.353217,51.032354];
path3651_0_points = [[33.949785,53.096085],[28.666995,58.404195],[26.598331,60.200580],[24.628502,61.491069],[22.763535,62.319760],[21.009456,62.730754],[19.372290,62.768152],[17.858065,62.476053],[16.472806,61.898557],[15.222540,61.079765],[14.113291,60.063776],[13.151088,58.894691],[12.341954,57.616609],[11.691918,56.273631],[11.207004,54.909856],[10.893238,53.569385],[10.756648,52.296318],[10.803259,51.134755],[15.992069,39.296555],[33.949785,53.096085]];
module poly_path3651(h, w, s, res=line_fn)
{
  scale([custom_scale_x, -custom_scale_y, 1]) union()
  {
    translate (path3651_0_center) linear_extrude(height=h, convexity=10, scale=0.01*s)
      translate (-path3651_0_center) polygon(path3651_0_points);
  }
}

path3653_0_center = [14.176413,24.151795];
path3653_0_points = [[17.105989,32.606555],[14.345949,34.669565],[10.887924,34.630638],[7.824455,35.001423],[6.378260,35.409324],[4.955801,36.002293],[3.532108,36.807878],[2.082215,37.853625],[0.829257,38.594934],[-0.410367,39.013913],[-1.618668,39.139334],[-2.777659,38.999966],[-3.869351,38.624579],[-4.875755,38.041945],[-5.778885,37.280834],[-6.560750,36.370015],[-7.203363,35.338260],[-7.688737,34.214339],[-7.998881,33.027022],[-8.115809,31.805079],[-8.021531,30.577282],[-7.698060,29.372400],[-7.127408,28.219205],[-6.291585,27.146465],[-5.774437,26.276695],[-4.723445,25.155158],[-1.763105,22.610160],[2.388785,19.486067],[6.544853,16.648282],[10.329768,14.343886],[13.765174,12.527264],[16.872717,11.152801],[19.674041,10.174883],[22.190792,9.547896],[24.444613,9.226225],[26.457151,9.164257],[28.250050,9.316376],[29.844956,9.636969],[32.527365,10.601117],[34.677538,11.691786],[36.468635,12.544061],[17.105989,32.606555]];
module poly_path3653(h, w, s, res=line_fn)
{
  scale([custom_scale_x, -custom_scale_y, 1]) union()
  {
    translate (path3653_0_center) linear_extrude(height=h, convexity=10, scale=0.01*s)
      translate (-path3653_0_center) polygon(path3653_0_points);
  }
}

module mini_outlines_large(h)
{
  difference()
  {
    union()
    {
      translate ([0,0,0]) poly_uppertrayoutline_0mm(0, min_line_mm(0.0999997), 100.0);
      translate ([0,0,0]) poly_circle6663(h, min_line_mm(0.208333), 100.0);
      translate ([0,0,0]) poly_circle6665(h, min_line_mm(0.208333), 100.0);
      translate ([0,0,0]) poly_circle7365(h, min_line_mm(0.208333), 100.0);
      translate ([0,0,0]) poly_path7367(h, min_line_mm(0.264583), 100.0);
      translate ([0,0,0]) poly_path7369(h, min_line_mm(0.264583), 100.0);
      translate ([0,0,0]) poly_path7371(h, min_line_mm(0.264583), 100.0);
      translate ([0,0,0]) poly_path7373(h, min_line_mm(0.264583), 100.0);
      translate ([0,0,0]) poly_path7375(h, min_line_mm(0.264583), 100.0);
      translate ([0,0,0]) poly_path7377(h, min_line_mm(0.264583), 100.0);
      translate ([0,0,0]) poly_path7379(h, min_line_mm(0.264583), 100.0);
      translate ([0,0,0]) poly_circle3647(h, min_line_mm(0.208333), 100.0);
      translate ([0,0,0]) poly_path3649(h, min_line_mm(0.264583), 100.0);
      translate ([0,0,0]) poly_path3651(h, min_line_mm(0.264583), 100.0);
      translate ([0,0,0]) poly_path3653(h, min_line_mm(0.264583), 100.0);
    }
    union()
    {
    }
  }
}

mini_outlines_large(zsize);
